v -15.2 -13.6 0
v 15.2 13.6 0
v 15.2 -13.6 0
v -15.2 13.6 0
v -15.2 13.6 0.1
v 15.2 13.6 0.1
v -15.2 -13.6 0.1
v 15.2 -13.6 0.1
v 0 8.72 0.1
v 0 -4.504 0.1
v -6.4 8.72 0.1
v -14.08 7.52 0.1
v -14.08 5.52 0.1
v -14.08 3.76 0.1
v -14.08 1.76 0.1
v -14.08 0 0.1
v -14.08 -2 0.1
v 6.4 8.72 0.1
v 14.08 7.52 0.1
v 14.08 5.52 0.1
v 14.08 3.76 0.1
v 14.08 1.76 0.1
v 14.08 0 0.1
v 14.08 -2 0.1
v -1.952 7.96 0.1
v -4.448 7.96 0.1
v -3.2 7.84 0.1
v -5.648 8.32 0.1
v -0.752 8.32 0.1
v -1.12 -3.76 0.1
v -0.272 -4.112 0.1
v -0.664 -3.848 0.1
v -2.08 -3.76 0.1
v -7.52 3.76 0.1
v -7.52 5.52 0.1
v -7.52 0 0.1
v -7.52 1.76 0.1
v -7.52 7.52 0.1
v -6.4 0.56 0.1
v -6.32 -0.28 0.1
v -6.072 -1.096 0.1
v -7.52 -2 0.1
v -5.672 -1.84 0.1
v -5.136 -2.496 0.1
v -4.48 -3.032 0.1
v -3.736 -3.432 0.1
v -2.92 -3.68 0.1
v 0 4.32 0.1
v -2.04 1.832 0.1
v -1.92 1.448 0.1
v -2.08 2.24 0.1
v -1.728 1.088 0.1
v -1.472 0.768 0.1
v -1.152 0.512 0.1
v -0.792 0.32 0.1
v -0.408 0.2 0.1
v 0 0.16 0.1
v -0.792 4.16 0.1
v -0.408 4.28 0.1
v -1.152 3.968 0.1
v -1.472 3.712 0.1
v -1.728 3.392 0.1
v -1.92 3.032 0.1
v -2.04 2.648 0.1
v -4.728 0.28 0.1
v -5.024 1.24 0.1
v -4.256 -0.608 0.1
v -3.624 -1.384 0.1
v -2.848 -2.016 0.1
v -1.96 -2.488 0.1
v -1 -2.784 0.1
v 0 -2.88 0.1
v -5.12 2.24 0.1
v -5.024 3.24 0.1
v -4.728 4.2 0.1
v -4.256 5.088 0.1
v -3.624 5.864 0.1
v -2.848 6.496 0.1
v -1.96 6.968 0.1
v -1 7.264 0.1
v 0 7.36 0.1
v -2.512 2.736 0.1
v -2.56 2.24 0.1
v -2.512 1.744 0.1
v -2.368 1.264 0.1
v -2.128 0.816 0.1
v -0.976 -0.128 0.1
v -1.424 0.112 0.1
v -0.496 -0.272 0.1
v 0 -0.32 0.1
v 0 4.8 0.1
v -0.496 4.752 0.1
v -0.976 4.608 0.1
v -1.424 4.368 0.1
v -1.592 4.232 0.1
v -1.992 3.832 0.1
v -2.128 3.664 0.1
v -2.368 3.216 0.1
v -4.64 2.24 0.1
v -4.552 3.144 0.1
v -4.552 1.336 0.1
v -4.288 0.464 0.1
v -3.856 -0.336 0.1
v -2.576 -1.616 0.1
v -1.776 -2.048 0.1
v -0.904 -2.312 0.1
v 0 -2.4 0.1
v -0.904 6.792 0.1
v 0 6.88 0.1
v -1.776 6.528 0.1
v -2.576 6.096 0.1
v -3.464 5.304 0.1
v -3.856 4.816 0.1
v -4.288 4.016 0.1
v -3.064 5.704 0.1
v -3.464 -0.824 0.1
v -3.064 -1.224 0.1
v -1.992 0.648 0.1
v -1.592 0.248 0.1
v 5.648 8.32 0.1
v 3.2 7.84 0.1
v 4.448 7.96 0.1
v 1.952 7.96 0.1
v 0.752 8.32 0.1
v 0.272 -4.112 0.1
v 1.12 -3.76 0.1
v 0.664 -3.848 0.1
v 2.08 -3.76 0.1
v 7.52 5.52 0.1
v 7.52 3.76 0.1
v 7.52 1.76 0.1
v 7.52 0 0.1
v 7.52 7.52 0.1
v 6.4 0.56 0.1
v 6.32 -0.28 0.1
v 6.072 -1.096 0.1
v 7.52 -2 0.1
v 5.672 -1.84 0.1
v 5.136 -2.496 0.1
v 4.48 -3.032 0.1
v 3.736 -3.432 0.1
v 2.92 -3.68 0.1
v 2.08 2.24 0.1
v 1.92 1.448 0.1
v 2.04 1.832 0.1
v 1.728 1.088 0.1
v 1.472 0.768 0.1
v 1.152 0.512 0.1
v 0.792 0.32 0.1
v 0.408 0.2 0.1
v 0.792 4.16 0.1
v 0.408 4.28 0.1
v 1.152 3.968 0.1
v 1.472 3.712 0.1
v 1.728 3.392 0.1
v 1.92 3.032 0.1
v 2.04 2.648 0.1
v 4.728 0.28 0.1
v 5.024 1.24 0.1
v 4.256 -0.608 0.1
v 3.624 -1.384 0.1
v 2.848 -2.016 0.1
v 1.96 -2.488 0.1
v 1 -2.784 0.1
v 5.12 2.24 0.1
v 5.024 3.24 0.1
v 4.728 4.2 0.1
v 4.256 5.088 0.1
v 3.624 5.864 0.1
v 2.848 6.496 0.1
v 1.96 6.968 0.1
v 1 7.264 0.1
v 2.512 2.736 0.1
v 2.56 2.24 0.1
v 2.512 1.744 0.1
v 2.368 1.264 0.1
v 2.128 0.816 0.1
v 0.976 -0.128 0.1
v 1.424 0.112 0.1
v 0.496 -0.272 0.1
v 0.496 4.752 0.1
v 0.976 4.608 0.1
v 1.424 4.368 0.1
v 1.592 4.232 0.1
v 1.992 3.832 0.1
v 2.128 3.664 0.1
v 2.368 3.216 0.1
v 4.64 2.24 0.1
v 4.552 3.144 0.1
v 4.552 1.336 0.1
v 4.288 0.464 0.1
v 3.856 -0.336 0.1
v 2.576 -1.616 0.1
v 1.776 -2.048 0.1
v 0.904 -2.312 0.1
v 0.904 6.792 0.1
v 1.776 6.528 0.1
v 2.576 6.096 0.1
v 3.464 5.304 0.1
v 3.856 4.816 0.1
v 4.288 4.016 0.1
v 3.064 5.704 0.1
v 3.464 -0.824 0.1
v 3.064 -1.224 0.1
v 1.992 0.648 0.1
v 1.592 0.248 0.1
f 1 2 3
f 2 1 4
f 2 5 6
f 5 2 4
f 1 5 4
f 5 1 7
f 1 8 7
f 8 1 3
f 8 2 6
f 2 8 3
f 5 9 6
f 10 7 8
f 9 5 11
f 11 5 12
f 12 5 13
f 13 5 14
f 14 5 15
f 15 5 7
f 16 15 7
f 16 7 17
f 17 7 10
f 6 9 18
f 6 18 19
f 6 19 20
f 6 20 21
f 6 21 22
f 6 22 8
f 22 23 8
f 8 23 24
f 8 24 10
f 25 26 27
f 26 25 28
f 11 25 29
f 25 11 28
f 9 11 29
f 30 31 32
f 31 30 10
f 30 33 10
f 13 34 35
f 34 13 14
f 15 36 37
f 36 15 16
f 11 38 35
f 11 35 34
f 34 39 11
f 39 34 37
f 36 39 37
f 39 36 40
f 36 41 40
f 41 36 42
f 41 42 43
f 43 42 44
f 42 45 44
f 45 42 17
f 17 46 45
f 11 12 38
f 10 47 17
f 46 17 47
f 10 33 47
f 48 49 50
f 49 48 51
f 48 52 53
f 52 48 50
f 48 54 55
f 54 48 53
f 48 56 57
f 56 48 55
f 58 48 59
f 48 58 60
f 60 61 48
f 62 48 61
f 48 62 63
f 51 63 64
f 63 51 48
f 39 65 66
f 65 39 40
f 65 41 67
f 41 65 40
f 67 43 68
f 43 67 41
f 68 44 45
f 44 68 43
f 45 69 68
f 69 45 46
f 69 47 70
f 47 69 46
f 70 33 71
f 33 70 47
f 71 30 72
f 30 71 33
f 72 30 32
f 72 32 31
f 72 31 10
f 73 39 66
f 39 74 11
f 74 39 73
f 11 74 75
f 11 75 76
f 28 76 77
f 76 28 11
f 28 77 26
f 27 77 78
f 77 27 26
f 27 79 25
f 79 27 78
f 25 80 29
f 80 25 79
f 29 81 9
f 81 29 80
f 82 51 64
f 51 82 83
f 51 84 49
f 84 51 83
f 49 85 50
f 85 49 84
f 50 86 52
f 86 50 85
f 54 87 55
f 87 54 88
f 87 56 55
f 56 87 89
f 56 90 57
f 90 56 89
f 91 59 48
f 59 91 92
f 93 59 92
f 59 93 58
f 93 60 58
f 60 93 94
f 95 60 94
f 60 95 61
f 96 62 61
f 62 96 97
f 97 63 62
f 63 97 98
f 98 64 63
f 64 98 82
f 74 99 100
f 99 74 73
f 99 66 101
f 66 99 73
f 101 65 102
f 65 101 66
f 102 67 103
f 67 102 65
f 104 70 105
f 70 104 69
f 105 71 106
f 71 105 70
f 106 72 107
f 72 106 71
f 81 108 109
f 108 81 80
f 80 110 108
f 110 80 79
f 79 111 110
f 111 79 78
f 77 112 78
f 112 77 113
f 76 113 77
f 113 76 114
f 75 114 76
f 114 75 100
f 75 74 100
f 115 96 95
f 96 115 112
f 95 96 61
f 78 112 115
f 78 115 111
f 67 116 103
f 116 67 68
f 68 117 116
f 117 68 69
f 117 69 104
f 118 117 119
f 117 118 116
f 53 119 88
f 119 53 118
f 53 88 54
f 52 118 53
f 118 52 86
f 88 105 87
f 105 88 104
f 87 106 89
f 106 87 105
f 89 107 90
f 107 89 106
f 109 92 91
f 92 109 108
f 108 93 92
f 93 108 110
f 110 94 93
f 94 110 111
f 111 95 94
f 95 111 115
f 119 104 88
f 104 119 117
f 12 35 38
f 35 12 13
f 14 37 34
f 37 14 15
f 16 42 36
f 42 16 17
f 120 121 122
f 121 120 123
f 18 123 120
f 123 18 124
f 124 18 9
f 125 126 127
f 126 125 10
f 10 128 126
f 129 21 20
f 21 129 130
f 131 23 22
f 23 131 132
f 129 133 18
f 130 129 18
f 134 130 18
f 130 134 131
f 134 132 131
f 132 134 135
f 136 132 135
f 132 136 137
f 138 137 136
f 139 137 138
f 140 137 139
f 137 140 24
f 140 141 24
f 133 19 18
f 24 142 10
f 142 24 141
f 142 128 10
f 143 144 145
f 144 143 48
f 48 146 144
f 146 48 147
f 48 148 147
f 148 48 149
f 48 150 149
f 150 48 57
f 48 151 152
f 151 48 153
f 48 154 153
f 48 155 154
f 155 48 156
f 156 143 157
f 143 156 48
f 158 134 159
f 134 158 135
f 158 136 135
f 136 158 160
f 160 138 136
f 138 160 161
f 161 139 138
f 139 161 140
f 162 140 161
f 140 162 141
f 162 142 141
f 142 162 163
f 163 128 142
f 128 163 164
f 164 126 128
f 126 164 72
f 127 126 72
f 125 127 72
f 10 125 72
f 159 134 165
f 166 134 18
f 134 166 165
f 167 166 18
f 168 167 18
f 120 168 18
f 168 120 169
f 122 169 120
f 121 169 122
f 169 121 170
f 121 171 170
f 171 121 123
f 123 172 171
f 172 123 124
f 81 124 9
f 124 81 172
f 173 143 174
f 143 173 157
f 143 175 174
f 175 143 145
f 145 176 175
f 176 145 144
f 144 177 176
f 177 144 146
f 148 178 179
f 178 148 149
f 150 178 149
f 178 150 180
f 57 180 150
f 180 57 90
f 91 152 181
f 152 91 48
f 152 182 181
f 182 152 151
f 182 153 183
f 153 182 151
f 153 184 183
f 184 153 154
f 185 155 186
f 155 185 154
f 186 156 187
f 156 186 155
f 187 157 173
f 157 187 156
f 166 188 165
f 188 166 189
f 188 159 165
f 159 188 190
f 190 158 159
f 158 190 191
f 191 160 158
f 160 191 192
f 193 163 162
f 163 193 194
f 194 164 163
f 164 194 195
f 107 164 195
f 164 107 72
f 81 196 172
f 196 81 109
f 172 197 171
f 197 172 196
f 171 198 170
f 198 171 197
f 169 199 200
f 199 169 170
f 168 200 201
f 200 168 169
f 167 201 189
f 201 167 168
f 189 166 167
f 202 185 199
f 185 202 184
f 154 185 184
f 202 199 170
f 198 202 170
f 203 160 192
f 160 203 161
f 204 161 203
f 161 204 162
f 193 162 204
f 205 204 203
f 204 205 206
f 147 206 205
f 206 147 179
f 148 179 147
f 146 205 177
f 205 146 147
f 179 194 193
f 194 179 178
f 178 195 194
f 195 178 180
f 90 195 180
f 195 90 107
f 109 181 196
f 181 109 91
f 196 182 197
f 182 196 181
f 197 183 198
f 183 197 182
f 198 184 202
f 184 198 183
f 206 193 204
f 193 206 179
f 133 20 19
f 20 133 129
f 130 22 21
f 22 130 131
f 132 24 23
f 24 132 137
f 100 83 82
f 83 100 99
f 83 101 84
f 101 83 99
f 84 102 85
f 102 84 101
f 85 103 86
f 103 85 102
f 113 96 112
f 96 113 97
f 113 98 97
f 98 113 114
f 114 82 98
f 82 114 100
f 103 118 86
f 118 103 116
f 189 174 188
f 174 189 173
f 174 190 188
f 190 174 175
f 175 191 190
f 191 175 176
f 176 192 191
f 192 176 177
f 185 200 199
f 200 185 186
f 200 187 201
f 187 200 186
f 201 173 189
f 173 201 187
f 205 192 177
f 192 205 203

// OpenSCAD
// file: s/169625as02.scad
use <../../lib.scad>
function ldraw_lib__s__169625as02() = [
// 0 ~Coast Guard (1995) Logo with Three Red Horizontal Stripes and Life Saver on Blue Crest - Quarter of Life Saver
// 0 Name: s\169625as02.dat
// 0 Author: Max Martin Richter [MMR1988]
// 0 !LDRAW_ORG Subpart UPDATE 2024-08
// 0 !LICENSE Licensed under CC BY 4.0 : see CAreadme.txt
// 
// 0 BFC CERTIFY CCW
  [0,"BFC","CERTIFY"],
  [0,"BFC","CCW"],
// 
// 0 !HISTORY 2024-09-30 [OrionP] Official Update 2024-08
// 
// 
// 4 16 -3.2 0 .3 -3.14 0 .92 -5.69 0 1.43 -5.8 0 .3
  [4,16,-3.2,0,.3,-3.14,0,.92,-5.69,0,1.43,-5.8,0,.3],
// 4 16 -3.14 0 -.32 -3.2 0 .3 -5.8 0 .3 -5.69 0 -.83
  [4,16,-3.14,0,-.32,-3.2,0,.3,-5.8,0,.3,-5.69,0,-.83],
// 4 16 -2.96 0 -.92 -3.14 0 -.32 -5.69 0 -.83 -5.36 0 -1.92
  [4,16,-2.96,0,-.92,-3.14,0,-.32,-5.69,0,-.83,-5.36,0,-1.92],
// 4 16 -2.66 0 -1.48 -2.96 0 -.92 -5.36 0 -1.92 -4.82 0 -2.92
  [4,16,-2.66,0,-1.48,-2.96,0,-.92,-5.36,0,-1.92,-4.82,0,-2.92],
// 4 16 -2.66 0 2.08 -2.49 0 2.29 -4.33 0 4.13 -4.82 0 3.52
  [4,16,-2.66,0,2.08,-2.49,0,2.29,-4.33,0,4.13,-4.82,0,3.52],
// 4 16 -2.96 0 1.52 -2.66 0 2.08 -4.82 0 3.52 -5.36 0 2.52
  [4,16,-2.96,0,1.52,-2.66,0,2.08,-4.82,0,3.52,-5.36,0,2.52],
// 4 16 -3.14 0 .92 -2.96 0 1.52 -5.36 0 2.52 -5.69 0 1.43
  [4,16,-3.14,0,.92,-2.96,0,1.52,-5.36,0,2.52,-5.69,0,1.43],
// 4 16 -4.33 0 -3.53 -2.49 0 -1.69 -2.66 0 -1.48 -4.82 0 -2.92
  [4,16,-4.33,0,-3.53,-2.49,0,-1.69,-2.66,0,-1.48,-4.82,0,-2.92],
];
module ldraw_lib__s__169625as02(step=0, col=false, unit=2/5, alt=false, line=0.2, solid=!$preview)
    makepoly(ldraw_lib__s__169625as02(), step=step, col=col, unit=unit, alt=alt, line=line, solid=solid);
ldraw_lib__s__169625as02(line=0.2);
// file: ../p/box5-12.scad
use <../lib.scad>
function ldraw_lib__box5_12() = [
// 0 Box with 5 Faces without Any Edges
// 0 Name: box5-12.dat
// 0 Author: Chris Dee [cwdee]
// 0 !LDRAW_ORG Primitive UPDATE 2009-02
// 0 !LICENSE Licensed under CC BY 4.0 : see CAreadme.txt
// 
// 0 BFC CERTIFY CCW
  [0,"BFC","CERTIFY"],
  [0,"BFC","CCW"],
// 
// 0 !HISTORY 2009-09-03 [PTadmin] Official Update 2009-02
// 
// 
// 4 16 1 1 1 1 1 -1 -1 1 -1 -1 1 1
  [4,16,1,1,1,1,1,-1,-1,1,-1,-1,1,1],
// 4 16 -1 0 1 1 0 1 1 1 1 -1 1 1
  [4,16,-1,0,1,1,0,1,1,1,1,-1,1,1],
// 4 16 -1 0 -1 -1 0 1 -1 1 1 -1 1 -1
  [4,16,-1,0,-1,-1,0,1,-1,1,1,-1,1,-1],
// 4 16 1 0 -1 -1 0 -1 -1 1 -1 1 1 -1
  [4,16,1,0,-1,-1,0,-1,-1,1,-1,1,1,-1],
// 4 16 1 0 1 1 0 -1 1 1 -1 1 1 1
  [4,16,1,0,1,1,0,-1,1,1,-1,1,1,1],
// 0
];
module ldraw_lib__box5_12(step=0, col=false, unit=2/5, alt=false, line=0.2, solid=!$preview)
    makepoly(ldraw_lib__box5_12(), step=step, col=col, unit=unit, alt=alt, line=line, solid=solid);
ldraw_lib__box5_12(line=0.2);
// main file
use <../lib.scad>
use <../p/box5-12.scad>
use <s/169625as01.scad>
use <s/169625as02.scad>
function ldraw_lib__169625e() = [
// 0 Sticker  3.4 x  3.8 with Coast Guard (1995) Logo
// 0 Name: 169625e.dat
// 0 Author: Gerald Lasser [GeraldLasser]
// 0 !LDRAW_ORG Part UPDATE 2024-08
// 0 !LICENSE Licensed under CC BY 4.0 : see CAreadme.txt
// 
// 0 BFC CERTIFY CCW
  [0,"BFC","CERTIFY"],
  [0,"BFC","CCW"],
// 
// 0 !KEYWORDS Bricklink 6338stk01, Brickowl 143926, Rebrickable 169625, Set 6338
// 
// 0 !HISTORY 2022-11-03 [Holly-Wood] Fixed unmatched edges
// 0 !HISTORY 2022-12-31 [MMR1988] Used s02 for correct colouring, removed NOCLIP statement
// 0 !HISTORY 2024-09-30 [OrionP] Official Update 2024-08
// 
// 
// 1 16 0 -.25 0 38 0 0 0 .25 0 0 0 34 box5-12.dat
  [1,16,0,-.25,0,38,0,0,0,.25,0,0,0,34, ldraw_lib__box5_12()],
// 
// 3 16 -38 -.25 34 0 -.25 21.8 38 -.25 34
  [3,16,-38,-.25,34,0,-.25,21.8,38,-.25,34],
// 3 16 0 -.25 -11.26 -38 -.25 -34 38 -.25 -34
  [3,16,0,-.25,-11.26,-38,-.25,-34,38,-.25,-34],
// 3 16 0 -.25 21.8 -38 -.25 34 -16 -.25 21.8
  [3,16,0,-.25,21.8,-38,-.25,34,-16,-.25,21.8],
// 3 16 -16 -.25 21.8 -38 -.25 34 -35.2 -.25 18.8
  [3,16,-16,-.25,21.8,-38,-.25,34,-35.2,-.25,18.8],
// 3 16 -35.2 -.25 18.8 -38 -.25 34 -35.2 -.25 13.8
  [3,16,-35.2,-.25,18.8,-38,-.25,34,-35.2,-.25,13.8],
// 3 16 -35.2 -.25 13.8 -38 -.25 34 -35.2 -.25 9.4
  [3,16,-35.2,-.25,13.8,-38,-.25,34,-35.2,-.25,9.4],
// 3 16 -35.2 -.25 9.4 -38 -.25 34 -35.2 -.25 4.4
  [3,16,-35.2,-.25,9.4,-38,-.25,34,-35.2,-.25,4.4],
// 3 16 -35.2 -.25 4.4 -38 -.25 34 -38 -.25 -34
  [3,16,-35.2,-.25,4.4,-38,-.25,34,-38,-.25,-34],
// 3 16 -35.2 -.25 0 -35.2 -.25 4.4 -38 -.25 -34
  [3,16,-35.2,-.25,0,-35.2,-.25,4.4,-38,-.25,-34],
// 3 16 -35.2 -.25 0 -38 -.25 -34 -35.2 -.25 -5
  [3,16,-35.2,-.25,0,-38,-.25,-34,-35.2,-.25,-5],
// 3 16 -35.2 -.25 -5 -38 -.25 -34 0 -.25 -11.26
  [3,16,-35.2,-.25,-5,-38,-.25,-34,0,-.25,-11.26],
// 3 16 38 -.25 34 0 -.25 21.8 16 -.25 21.8
  [3,16,38,-.25,34,0,-.25,21.8,16,-.25,21.8],
// 3 16 38 -.25 34 16 -.25 21.8 35.2 -.25 18.8
  [3,16,38,-.25,34,16,-.25,21.8,35.2,-.25,18.8],
// 3 16 38 -.25 34 35.2 -.25 18.8 35.2 -.25 13.8
  [3,16,38,-.25,34,35.2,-.25,18.8,35.2,-.25,13.8],
// 3 16 38 -.25 34 35.2 -.25 13.8 35.2 -.25 9.4
  [3,16,38,-.25,34,35.2,-.25,13.8,35.2,-.25,9.4],
// 3 16 38 -.25 34 35.2 -.25 9.4 35.2 -.25 4.4
  [3,16,38,-.25,34,35.2,-.25,9.4,35.2,-.25,4.4],
// 3 16 38 -.25 34 35.2 -.25 4.4 38 -.25 -34
  [3,16,38,-.25,34,35.2,-.25,4.4,38,-.25,-34],
// 3 16 35.2 -.25 4.4 35.2 -.25 0 38 -.25 -34
  [3,16,35.2,-.25,4.4,35.2,-.25,0,38,-.25,-34],
// 3 16 38 -.25 -34 35.2 -.25 0 35.2 -.25 -5
  [3,16,38,-.25,-34,35.2,-.25,0,35.2,-.25,-5],
// 3 16 38 -.25 -34 35.2 -.25 -5 0 -.25 -11.26
  [3,16,38,-.25,-34,35.2,-.25,-5,0,-.25,-11.26],
// 
// 1 16 0 -.25 5 2 0 0 0 1 0 0 0 2 s\169625as01.dat
  [1,16,0,-.25,5,2,0,0,0,1,0,0,0,2, ldraw_lib__s__169625as01()],
// 1 16 0 -.25 5 -2 0 0 0 1 0 0 0 2 s\169625as01.dat
  [1,16,0,-.25,5,-2,0,0,0,1,0,0,0,2, ldraw_lib__s__169625as01()],
// 1 16 0 -.25 5 2 0 0 0 1 0 0 0 2 s\169625as02.dat
  [1,16,0,-.25,5,2,0,0,0,1,0,0,0,2, ldraw_lib__s__169625as02()],
// 1 16 0 -.25 5 -2 0 0 0 1 0 0 0 2 s\169625as02.dat
  [1,16,0,-.25,5,-2,0,0,0,1,0,0,0,2, ldraw_lib__s__169625as02()],
];
module ldraw_lib__169625e(step=0, col=false, unit=2/5, alt=false, line=0.2, solid=!$preview)
    makepoly(ldraw_lib__169625e(), step=step, col=col, unit=unit, alt=alt, line=line, solid=solid);
ldraw_lib__169625e(line=0.2);
